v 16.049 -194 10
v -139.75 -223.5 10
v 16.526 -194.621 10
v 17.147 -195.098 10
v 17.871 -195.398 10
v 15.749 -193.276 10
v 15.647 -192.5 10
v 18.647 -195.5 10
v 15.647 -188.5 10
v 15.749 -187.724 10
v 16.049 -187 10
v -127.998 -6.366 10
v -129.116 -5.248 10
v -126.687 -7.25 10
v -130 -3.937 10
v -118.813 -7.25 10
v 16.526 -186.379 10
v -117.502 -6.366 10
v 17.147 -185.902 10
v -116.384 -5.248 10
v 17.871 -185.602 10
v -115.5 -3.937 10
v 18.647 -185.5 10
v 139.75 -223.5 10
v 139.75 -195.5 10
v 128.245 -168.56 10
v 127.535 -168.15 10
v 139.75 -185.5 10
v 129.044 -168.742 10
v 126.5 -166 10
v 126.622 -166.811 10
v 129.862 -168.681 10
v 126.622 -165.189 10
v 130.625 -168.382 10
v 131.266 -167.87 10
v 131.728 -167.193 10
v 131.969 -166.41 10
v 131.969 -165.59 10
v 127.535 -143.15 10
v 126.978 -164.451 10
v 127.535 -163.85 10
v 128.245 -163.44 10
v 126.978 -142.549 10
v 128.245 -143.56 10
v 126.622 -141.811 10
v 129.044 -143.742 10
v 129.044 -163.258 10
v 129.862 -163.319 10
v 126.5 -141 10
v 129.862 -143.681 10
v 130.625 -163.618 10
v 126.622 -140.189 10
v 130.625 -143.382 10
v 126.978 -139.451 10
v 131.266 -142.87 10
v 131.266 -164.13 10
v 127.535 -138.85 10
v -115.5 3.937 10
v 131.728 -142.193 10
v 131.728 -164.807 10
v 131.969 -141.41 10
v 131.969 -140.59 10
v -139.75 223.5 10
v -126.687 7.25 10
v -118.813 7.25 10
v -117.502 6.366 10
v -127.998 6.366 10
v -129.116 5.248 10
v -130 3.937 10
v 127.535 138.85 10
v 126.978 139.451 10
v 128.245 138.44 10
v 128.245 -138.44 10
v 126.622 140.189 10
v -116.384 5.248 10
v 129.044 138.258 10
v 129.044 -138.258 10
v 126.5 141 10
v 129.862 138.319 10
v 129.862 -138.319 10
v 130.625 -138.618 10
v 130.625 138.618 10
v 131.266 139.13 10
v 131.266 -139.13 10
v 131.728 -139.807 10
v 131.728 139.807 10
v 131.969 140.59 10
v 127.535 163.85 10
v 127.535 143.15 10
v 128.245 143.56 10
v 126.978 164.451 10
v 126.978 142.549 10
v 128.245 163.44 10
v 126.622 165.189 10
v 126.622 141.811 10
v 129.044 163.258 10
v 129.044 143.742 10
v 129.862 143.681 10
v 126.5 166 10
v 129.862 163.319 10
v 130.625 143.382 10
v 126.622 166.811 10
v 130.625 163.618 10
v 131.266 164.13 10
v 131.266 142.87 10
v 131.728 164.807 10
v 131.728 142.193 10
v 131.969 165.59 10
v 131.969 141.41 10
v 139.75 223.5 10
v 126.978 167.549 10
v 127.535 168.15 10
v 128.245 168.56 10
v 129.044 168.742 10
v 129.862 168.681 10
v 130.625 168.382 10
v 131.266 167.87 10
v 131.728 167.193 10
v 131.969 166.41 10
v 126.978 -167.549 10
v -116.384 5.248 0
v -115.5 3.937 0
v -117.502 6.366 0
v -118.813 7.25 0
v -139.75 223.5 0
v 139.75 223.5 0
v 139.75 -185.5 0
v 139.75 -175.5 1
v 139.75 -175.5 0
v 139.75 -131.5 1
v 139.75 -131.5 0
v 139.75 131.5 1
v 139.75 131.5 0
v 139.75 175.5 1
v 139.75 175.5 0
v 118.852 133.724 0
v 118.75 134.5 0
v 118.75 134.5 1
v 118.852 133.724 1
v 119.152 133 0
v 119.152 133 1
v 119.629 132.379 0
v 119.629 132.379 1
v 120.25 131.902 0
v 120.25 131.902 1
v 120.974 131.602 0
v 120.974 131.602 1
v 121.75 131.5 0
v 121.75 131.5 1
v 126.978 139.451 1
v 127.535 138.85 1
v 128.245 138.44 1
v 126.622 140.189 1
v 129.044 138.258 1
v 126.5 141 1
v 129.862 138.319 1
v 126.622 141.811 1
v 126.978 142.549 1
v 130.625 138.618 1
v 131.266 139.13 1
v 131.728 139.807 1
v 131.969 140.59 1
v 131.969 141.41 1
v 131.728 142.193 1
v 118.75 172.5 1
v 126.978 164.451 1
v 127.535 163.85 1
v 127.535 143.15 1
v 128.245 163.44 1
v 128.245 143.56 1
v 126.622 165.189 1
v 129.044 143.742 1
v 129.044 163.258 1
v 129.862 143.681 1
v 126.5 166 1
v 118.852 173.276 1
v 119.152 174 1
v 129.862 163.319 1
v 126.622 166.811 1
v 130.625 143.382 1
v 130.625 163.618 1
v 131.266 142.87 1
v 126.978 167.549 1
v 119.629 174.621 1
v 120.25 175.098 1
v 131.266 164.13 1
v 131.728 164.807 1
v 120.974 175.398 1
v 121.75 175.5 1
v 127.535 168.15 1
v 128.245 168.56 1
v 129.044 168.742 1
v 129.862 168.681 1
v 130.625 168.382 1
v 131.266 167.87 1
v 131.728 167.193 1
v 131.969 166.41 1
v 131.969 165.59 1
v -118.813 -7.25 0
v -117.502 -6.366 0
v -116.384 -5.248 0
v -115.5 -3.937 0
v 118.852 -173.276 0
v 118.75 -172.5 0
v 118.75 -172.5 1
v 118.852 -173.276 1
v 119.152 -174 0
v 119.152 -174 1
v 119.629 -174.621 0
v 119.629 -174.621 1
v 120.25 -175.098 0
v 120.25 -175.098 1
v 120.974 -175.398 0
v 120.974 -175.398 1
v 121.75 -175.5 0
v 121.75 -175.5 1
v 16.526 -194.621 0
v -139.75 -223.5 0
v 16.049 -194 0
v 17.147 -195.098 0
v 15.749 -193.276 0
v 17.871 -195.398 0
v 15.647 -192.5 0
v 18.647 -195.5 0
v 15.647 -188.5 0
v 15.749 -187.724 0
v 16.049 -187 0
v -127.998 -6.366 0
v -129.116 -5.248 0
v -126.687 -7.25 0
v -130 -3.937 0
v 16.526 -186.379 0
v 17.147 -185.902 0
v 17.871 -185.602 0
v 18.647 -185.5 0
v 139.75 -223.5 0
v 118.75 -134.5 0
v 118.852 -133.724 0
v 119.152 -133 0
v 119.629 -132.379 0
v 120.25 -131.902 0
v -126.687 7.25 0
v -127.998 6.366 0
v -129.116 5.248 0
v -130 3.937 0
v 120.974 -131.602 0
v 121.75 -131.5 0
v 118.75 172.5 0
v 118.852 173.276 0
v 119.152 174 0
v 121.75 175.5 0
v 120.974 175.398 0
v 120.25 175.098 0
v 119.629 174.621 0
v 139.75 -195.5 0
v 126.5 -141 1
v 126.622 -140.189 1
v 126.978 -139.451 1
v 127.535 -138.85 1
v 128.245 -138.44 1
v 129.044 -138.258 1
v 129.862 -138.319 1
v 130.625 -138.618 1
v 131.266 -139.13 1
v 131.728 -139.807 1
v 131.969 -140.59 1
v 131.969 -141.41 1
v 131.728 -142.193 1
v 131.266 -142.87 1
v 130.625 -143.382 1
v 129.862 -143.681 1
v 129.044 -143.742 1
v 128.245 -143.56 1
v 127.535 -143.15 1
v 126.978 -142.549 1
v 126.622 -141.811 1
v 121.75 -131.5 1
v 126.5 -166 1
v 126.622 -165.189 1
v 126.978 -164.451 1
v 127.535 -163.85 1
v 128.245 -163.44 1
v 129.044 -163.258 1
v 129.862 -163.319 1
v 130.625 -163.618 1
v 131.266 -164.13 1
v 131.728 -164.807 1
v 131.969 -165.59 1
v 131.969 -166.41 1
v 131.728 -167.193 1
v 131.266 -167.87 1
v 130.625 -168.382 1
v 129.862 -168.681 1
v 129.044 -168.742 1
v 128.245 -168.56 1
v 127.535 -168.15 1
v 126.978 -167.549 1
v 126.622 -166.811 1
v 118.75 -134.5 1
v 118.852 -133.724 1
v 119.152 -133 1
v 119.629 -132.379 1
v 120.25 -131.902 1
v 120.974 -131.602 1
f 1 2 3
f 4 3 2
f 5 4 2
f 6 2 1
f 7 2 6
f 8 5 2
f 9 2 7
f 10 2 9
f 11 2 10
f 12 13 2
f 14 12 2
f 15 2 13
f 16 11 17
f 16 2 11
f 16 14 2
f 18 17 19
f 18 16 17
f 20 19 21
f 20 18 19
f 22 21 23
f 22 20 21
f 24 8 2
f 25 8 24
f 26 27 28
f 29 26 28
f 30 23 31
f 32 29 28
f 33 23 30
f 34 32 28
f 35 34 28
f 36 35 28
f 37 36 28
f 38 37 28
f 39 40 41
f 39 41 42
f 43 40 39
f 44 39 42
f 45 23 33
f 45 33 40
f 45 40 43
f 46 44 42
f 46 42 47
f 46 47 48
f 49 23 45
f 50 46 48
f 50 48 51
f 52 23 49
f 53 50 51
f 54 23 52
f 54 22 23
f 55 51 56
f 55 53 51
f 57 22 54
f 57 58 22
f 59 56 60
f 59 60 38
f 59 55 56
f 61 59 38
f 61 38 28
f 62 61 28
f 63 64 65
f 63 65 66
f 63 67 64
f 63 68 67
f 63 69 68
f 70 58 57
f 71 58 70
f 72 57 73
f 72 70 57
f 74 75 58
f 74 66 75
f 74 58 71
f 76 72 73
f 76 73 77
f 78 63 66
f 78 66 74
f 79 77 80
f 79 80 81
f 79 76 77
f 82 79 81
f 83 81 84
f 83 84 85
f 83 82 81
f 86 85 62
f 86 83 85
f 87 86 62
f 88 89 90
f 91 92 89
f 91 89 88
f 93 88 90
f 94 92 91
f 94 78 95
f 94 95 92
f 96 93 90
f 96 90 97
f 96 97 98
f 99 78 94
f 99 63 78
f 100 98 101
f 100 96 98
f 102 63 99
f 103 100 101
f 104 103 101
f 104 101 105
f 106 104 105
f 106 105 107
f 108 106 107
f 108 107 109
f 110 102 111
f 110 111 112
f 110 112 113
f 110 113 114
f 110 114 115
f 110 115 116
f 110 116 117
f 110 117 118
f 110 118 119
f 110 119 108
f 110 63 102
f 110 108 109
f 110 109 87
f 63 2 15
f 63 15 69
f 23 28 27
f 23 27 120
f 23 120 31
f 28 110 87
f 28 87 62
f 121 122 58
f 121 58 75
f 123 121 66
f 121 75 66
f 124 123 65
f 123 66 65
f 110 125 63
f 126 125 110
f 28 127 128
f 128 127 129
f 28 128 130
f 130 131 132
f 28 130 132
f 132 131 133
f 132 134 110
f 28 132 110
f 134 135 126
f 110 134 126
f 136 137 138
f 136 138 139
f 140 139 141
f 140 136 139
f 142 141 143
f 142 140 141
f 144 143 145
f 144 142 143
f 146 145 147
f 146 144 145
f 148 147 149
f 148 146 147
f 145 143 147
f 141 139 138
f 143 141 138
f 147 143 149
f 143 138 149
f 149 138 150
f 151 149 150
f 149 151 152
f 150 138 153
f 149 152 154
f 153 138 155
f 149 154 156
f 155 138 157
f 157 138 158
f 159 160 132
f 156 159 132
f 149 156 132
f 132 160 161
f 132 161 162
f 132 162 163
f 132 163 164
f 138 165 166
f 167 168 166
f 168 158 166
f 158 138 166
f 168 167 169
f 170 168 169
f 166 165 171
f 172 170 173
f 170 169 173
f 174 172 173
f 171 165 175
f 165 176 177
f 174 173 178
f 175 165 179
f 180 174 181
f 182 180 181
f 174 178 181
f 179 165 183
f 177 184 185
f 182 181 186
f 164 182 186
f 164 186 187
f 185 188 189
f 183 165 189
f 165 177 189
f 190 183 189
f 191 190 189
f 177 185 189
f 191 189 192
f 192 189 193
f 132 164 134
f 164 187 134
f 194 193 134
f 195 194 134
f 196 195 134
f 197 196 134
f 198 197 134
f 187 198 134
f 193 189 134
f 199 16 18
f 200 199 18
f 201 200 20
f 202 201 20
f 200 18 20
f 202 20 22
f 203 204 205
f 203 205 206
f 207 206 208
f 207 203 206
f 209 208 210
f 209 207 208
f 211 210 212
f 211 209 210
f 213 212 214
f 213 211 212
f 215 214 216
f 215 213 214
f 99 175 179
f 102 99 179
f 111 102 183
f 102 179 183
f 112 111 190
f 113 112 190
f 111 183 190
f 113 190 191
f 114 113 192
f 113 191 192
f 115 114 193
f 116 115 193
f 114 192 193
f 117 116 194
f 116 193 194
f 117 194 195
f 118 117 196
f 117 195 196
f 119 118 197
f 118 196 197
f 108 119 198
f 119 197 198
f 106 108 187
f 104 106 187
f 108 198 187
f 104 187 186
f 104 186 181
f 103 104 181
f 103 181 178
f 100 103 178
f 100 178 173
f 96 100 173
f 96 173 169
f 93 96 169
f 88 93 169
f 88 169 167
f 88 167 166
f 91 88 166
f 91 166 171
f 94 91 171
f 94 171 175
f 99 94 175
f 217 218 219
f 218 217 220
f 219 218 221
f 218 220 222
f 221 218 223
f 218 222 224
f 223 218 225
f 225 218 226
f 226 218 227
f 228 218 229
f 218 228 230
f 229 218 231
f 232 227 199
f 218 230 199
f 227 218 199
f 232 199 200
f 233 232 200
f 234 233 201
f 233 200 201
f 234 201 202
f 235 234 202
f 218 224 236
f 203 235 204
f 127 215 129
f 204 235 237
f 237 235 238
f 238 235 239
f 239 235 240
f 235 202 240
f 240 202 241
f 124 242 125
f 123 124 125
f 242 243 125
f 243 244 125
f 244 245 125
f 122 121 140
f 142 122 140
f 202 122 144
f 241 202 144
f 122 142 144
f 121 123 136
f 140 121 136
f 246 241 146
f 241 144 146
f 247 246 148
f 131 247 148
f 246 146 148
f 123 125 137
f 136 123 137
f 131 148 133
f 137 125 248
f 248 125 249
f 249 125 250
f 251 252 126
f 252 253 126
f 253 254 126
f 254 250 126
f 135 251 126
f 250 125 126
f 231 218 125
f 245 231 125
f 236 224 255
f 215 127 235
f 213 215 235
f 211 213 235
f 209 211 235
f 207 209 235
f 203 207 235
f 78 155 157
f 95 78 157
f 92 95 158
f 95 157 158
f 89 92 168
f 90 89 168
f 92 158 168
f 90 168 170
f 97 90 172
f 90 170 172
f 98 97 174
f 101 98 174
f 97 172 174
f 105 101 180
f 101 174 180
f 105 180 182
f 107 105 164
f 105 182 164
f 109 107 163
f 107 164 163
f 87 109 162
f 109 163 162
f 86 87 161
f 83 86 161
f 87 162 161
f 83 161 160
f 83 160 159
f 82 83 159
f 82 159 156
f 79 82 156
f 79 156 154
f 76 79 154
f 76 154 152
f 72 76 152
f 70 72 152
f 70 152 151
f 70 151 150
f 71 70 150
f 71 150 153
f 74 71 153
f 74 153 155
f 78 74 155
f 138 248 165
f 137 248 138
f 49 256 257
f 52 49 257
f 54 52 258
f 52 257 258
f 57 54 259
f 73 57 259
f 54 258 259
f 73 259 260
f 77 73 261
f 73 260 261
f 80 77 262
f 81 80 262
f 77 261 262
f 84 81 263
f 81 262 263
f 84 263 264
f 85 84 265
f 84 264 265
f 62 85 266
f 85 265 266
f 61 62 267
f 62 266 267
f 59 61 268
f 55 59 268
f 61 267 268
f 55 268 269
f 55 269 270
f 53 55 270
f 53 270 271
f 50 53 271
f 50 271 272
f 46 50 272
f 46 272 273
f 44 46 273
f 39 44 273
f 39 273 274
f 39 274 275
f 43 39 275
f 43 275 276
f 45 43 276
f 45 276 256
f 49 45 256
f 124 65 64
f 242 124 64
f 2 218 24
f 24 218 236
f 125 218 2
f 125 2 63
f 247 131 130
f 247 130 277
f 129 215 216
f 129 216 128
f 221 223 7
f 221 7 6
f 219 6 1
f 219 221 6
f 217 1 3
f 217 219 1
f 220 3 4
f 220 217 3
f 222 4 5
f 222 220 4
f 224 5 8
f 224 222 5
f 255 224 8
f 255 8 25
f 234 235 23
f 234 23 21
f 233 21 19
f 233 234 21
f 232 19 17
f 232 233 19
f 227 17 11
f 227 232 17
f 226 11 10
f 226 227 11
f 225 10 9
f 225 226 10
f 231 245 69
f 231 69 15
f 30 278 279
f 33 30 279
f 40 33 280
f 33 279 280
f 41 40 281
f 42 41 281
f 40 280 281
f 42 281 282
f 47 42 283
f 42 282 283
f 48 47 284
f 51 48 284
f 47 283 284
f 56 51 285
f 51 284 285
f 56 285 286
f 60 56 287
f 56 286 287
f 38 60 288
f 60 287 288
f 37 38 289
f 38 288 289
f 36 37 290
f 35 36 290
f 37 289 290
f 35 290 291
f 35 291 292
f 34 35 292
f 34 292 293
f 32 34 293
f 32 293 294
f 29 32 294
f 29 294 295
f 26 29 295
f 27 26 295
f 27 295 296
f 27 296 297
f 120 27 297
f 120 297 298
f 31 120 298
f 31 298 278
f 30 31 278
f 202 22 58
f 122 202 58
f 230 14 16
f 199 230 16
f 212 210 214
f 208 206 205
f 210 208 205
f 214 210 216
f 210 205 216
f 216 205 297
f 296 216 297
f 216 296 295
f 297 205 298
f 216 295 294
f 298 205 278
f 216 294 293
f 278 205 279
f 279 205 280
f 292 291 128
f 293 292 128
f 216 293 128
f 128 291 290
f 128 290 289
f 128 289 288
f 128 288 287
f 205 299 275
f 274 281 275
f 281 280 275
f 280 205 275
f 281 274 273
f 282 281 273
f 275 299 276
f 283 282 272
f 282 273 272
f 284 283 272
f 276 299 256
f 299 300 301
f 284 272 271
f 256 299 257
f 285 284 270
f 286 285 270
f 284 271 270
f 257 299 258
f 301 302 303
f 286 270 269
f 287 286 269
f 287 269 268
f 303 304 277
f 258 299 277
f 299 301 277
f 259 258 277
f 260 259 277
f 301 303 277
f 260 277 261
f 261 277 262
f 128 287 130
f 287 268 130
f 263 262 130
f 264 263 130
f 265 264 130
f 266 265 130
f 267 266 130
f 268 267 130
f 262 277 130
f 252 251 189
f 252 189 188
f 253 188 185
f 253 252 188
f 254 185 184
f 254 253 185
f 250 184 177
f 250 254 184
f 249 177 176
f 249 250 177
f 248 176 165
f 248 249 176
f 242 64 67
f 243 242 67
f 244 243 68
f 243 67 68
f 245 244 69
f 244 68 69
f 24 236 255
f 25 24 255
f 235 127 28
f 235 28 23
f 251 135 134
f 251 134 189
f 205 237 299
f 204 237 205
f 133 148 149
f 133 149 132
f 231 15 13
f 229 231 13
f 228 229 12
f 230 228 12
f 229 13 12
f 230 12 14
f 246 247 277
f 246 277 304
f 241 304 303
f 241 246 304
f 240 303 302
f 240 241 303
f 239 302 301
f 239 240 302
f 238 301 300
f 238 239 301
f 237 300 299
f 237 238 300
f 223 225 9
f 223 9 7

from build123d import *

# Parameters (mm, degrees)
SKETCH1_W           = 279.5
SKETCH1_H           = 447
BOSS_EXTRUDE1_DEPTH = 10
CUT_EXTRUDE1_DEPTH  = 1
SKETCH3_R           = 2.75
CUT_EXTRUDE2_DEPTH  = 264.748578195
CUT_EXTRUDE3_DEPTH  = 264.784594888
CUT_EXTRUDE4_DEPTH  = 264.784594888


with BuildPart() as part:
    # Sketch1 → Boss-Extrude1 (new body)
    with BuildSketch(Plane.XY):
        Rectangle(SKETCH1_W, SKETCH1_H)
    extrude(amount=BOSS_EXTRUDE1_DEPTH)

    # Sketch2 → Cut-Extrude1 (cut)
    with BuildSketch(Plane(origin=(0, 0, 0), x_dir=(-1, 0, 0), z_dir=(0, 0, -1))):
        with BuildLine():
            Line((-139.75, 175.5), (-121.75, 175.5))
            ThreePointArc((-121.75, 175.5), (-119.628679656, 174.621320344), (-118.75, 172.5))
            Line((-118.75, 172.5), (-118.75, 134.5))
            ThreePointArc((-118.75, 134.5), (-119.628679656, 132.378679656), (-121.75, 131.5))
            Line((-121.75, 131.5), (-139.75, 131.5))
            Line((-139.75, 131.5), (-139.75, 175.5))
        make_face()
        with BuildLine():
            Line((-139.75, -131.5), (-121.75, -131.5))
            ThreePointArc((-121.75, -131.5), (-119.628679656, -132.378679656), (-118.75, -134.5))
            Line((-118.75, -134.5), (-118.75, -172.5))
            ThreePointArc((-118.75, -172.5), (-119.628679656, -174.621320344), (-121.75, -175.5))
            Line((-121.75, -175.5), (-139.75, -175.5))
            Line((-139.75, -175.5), (-139.75, -131.5))
        make_face()
    extrude(amount=-CUT_EXTRUDE1_DEPTH, mode=Mode.SUBTRACT)

    # Sketch3 → Cut-Extrude2 (cut, through all)
    with BuildSketch(Plane(origin=(0, 0, 1), x_dir=(-1, 0, 0), z_dir=(0, 0, -1))):
        with Locations((-129.25, 166)):
            Circle(SKETCH3_R)
        with Locations((-129.25, 141)):
            Circle(SKETCH3_R)
        with Locations((-129.25, -141)):
            Circle(SKETCH3_R)
        with Locations((-129.25, -166)):
            Circle(SKETCH3_R)
    extrude(amount=-CUT_EXTRUDE2_DEPTH, mode=Mode.SUBTRACT)

    # Sketch4 → Cut-Extrude3 (cut, through all)
    with BuildSketch(Plane(origin=(0, 0, 0), x_dir=(-1, 0, 0), z_dir=(0, 0, -1))):
        with BuildLine():
            Line((-140.75, -185.5), (-18.647208755, -185.5))
            ThreePointArc((-18.647208755, -185.5), (-16.525888411, -186.378679656), (-15.647208755, -188.5))
            Line((-15.647208755, -188.5), (-15.647208755, -192.5))
            ThreePointArc((-15.647208755, -192.5), (-16.525888411, -194.621320344), (-18.647208755, -195.5))
            Line((-18.647208755, -195.5), (-140.75, -195.5))
            Line((-140.75, -195.5), (-140.75, -185.5))
        make_face()
    extrude(amount=-CUT_EXTRUDE3_DEPTH, mode=Mode.SUBTRACT)

    # Sketch5 → Cut-Extrude4 (cut, through all)
    with BuildSketch(Plane.XY.offset(10)):
        with BuildLine():
            Line((-118.812996063, 7.25), (-126.687003937, 7.25))
            ThreePointArc((-126.687003937, 7.25), (-128.583630945, 5.833630945), (-130, 3.937003937))
            Line((-130, 3.937003937), (-130, -3.937003937))
            ThreePointArc((-130, -3.937003937), (-128.583630945, -5.833630945), (-126.687003937, -7.25))
            Line((-126.687003937, -7.25), (-118.812996063, -7.25))
            ThreePointArc((-118.812996063, -7.25), (-116.916369055, -5.833630945), (-115.5, -3.937003937))
            Line((-115.5, -3.937003937), (-115.5, 3.937003937))
            ThreePointArc((-115.5, 3.937003937), (-116.916369055, 5.833630945), (-118.812996063, 7.25))
        make_face()
    extrude(amount=-CUT_EXTRUDE4_DEPTH, mode=Mode.SUBTRACT)


solid = part.part
